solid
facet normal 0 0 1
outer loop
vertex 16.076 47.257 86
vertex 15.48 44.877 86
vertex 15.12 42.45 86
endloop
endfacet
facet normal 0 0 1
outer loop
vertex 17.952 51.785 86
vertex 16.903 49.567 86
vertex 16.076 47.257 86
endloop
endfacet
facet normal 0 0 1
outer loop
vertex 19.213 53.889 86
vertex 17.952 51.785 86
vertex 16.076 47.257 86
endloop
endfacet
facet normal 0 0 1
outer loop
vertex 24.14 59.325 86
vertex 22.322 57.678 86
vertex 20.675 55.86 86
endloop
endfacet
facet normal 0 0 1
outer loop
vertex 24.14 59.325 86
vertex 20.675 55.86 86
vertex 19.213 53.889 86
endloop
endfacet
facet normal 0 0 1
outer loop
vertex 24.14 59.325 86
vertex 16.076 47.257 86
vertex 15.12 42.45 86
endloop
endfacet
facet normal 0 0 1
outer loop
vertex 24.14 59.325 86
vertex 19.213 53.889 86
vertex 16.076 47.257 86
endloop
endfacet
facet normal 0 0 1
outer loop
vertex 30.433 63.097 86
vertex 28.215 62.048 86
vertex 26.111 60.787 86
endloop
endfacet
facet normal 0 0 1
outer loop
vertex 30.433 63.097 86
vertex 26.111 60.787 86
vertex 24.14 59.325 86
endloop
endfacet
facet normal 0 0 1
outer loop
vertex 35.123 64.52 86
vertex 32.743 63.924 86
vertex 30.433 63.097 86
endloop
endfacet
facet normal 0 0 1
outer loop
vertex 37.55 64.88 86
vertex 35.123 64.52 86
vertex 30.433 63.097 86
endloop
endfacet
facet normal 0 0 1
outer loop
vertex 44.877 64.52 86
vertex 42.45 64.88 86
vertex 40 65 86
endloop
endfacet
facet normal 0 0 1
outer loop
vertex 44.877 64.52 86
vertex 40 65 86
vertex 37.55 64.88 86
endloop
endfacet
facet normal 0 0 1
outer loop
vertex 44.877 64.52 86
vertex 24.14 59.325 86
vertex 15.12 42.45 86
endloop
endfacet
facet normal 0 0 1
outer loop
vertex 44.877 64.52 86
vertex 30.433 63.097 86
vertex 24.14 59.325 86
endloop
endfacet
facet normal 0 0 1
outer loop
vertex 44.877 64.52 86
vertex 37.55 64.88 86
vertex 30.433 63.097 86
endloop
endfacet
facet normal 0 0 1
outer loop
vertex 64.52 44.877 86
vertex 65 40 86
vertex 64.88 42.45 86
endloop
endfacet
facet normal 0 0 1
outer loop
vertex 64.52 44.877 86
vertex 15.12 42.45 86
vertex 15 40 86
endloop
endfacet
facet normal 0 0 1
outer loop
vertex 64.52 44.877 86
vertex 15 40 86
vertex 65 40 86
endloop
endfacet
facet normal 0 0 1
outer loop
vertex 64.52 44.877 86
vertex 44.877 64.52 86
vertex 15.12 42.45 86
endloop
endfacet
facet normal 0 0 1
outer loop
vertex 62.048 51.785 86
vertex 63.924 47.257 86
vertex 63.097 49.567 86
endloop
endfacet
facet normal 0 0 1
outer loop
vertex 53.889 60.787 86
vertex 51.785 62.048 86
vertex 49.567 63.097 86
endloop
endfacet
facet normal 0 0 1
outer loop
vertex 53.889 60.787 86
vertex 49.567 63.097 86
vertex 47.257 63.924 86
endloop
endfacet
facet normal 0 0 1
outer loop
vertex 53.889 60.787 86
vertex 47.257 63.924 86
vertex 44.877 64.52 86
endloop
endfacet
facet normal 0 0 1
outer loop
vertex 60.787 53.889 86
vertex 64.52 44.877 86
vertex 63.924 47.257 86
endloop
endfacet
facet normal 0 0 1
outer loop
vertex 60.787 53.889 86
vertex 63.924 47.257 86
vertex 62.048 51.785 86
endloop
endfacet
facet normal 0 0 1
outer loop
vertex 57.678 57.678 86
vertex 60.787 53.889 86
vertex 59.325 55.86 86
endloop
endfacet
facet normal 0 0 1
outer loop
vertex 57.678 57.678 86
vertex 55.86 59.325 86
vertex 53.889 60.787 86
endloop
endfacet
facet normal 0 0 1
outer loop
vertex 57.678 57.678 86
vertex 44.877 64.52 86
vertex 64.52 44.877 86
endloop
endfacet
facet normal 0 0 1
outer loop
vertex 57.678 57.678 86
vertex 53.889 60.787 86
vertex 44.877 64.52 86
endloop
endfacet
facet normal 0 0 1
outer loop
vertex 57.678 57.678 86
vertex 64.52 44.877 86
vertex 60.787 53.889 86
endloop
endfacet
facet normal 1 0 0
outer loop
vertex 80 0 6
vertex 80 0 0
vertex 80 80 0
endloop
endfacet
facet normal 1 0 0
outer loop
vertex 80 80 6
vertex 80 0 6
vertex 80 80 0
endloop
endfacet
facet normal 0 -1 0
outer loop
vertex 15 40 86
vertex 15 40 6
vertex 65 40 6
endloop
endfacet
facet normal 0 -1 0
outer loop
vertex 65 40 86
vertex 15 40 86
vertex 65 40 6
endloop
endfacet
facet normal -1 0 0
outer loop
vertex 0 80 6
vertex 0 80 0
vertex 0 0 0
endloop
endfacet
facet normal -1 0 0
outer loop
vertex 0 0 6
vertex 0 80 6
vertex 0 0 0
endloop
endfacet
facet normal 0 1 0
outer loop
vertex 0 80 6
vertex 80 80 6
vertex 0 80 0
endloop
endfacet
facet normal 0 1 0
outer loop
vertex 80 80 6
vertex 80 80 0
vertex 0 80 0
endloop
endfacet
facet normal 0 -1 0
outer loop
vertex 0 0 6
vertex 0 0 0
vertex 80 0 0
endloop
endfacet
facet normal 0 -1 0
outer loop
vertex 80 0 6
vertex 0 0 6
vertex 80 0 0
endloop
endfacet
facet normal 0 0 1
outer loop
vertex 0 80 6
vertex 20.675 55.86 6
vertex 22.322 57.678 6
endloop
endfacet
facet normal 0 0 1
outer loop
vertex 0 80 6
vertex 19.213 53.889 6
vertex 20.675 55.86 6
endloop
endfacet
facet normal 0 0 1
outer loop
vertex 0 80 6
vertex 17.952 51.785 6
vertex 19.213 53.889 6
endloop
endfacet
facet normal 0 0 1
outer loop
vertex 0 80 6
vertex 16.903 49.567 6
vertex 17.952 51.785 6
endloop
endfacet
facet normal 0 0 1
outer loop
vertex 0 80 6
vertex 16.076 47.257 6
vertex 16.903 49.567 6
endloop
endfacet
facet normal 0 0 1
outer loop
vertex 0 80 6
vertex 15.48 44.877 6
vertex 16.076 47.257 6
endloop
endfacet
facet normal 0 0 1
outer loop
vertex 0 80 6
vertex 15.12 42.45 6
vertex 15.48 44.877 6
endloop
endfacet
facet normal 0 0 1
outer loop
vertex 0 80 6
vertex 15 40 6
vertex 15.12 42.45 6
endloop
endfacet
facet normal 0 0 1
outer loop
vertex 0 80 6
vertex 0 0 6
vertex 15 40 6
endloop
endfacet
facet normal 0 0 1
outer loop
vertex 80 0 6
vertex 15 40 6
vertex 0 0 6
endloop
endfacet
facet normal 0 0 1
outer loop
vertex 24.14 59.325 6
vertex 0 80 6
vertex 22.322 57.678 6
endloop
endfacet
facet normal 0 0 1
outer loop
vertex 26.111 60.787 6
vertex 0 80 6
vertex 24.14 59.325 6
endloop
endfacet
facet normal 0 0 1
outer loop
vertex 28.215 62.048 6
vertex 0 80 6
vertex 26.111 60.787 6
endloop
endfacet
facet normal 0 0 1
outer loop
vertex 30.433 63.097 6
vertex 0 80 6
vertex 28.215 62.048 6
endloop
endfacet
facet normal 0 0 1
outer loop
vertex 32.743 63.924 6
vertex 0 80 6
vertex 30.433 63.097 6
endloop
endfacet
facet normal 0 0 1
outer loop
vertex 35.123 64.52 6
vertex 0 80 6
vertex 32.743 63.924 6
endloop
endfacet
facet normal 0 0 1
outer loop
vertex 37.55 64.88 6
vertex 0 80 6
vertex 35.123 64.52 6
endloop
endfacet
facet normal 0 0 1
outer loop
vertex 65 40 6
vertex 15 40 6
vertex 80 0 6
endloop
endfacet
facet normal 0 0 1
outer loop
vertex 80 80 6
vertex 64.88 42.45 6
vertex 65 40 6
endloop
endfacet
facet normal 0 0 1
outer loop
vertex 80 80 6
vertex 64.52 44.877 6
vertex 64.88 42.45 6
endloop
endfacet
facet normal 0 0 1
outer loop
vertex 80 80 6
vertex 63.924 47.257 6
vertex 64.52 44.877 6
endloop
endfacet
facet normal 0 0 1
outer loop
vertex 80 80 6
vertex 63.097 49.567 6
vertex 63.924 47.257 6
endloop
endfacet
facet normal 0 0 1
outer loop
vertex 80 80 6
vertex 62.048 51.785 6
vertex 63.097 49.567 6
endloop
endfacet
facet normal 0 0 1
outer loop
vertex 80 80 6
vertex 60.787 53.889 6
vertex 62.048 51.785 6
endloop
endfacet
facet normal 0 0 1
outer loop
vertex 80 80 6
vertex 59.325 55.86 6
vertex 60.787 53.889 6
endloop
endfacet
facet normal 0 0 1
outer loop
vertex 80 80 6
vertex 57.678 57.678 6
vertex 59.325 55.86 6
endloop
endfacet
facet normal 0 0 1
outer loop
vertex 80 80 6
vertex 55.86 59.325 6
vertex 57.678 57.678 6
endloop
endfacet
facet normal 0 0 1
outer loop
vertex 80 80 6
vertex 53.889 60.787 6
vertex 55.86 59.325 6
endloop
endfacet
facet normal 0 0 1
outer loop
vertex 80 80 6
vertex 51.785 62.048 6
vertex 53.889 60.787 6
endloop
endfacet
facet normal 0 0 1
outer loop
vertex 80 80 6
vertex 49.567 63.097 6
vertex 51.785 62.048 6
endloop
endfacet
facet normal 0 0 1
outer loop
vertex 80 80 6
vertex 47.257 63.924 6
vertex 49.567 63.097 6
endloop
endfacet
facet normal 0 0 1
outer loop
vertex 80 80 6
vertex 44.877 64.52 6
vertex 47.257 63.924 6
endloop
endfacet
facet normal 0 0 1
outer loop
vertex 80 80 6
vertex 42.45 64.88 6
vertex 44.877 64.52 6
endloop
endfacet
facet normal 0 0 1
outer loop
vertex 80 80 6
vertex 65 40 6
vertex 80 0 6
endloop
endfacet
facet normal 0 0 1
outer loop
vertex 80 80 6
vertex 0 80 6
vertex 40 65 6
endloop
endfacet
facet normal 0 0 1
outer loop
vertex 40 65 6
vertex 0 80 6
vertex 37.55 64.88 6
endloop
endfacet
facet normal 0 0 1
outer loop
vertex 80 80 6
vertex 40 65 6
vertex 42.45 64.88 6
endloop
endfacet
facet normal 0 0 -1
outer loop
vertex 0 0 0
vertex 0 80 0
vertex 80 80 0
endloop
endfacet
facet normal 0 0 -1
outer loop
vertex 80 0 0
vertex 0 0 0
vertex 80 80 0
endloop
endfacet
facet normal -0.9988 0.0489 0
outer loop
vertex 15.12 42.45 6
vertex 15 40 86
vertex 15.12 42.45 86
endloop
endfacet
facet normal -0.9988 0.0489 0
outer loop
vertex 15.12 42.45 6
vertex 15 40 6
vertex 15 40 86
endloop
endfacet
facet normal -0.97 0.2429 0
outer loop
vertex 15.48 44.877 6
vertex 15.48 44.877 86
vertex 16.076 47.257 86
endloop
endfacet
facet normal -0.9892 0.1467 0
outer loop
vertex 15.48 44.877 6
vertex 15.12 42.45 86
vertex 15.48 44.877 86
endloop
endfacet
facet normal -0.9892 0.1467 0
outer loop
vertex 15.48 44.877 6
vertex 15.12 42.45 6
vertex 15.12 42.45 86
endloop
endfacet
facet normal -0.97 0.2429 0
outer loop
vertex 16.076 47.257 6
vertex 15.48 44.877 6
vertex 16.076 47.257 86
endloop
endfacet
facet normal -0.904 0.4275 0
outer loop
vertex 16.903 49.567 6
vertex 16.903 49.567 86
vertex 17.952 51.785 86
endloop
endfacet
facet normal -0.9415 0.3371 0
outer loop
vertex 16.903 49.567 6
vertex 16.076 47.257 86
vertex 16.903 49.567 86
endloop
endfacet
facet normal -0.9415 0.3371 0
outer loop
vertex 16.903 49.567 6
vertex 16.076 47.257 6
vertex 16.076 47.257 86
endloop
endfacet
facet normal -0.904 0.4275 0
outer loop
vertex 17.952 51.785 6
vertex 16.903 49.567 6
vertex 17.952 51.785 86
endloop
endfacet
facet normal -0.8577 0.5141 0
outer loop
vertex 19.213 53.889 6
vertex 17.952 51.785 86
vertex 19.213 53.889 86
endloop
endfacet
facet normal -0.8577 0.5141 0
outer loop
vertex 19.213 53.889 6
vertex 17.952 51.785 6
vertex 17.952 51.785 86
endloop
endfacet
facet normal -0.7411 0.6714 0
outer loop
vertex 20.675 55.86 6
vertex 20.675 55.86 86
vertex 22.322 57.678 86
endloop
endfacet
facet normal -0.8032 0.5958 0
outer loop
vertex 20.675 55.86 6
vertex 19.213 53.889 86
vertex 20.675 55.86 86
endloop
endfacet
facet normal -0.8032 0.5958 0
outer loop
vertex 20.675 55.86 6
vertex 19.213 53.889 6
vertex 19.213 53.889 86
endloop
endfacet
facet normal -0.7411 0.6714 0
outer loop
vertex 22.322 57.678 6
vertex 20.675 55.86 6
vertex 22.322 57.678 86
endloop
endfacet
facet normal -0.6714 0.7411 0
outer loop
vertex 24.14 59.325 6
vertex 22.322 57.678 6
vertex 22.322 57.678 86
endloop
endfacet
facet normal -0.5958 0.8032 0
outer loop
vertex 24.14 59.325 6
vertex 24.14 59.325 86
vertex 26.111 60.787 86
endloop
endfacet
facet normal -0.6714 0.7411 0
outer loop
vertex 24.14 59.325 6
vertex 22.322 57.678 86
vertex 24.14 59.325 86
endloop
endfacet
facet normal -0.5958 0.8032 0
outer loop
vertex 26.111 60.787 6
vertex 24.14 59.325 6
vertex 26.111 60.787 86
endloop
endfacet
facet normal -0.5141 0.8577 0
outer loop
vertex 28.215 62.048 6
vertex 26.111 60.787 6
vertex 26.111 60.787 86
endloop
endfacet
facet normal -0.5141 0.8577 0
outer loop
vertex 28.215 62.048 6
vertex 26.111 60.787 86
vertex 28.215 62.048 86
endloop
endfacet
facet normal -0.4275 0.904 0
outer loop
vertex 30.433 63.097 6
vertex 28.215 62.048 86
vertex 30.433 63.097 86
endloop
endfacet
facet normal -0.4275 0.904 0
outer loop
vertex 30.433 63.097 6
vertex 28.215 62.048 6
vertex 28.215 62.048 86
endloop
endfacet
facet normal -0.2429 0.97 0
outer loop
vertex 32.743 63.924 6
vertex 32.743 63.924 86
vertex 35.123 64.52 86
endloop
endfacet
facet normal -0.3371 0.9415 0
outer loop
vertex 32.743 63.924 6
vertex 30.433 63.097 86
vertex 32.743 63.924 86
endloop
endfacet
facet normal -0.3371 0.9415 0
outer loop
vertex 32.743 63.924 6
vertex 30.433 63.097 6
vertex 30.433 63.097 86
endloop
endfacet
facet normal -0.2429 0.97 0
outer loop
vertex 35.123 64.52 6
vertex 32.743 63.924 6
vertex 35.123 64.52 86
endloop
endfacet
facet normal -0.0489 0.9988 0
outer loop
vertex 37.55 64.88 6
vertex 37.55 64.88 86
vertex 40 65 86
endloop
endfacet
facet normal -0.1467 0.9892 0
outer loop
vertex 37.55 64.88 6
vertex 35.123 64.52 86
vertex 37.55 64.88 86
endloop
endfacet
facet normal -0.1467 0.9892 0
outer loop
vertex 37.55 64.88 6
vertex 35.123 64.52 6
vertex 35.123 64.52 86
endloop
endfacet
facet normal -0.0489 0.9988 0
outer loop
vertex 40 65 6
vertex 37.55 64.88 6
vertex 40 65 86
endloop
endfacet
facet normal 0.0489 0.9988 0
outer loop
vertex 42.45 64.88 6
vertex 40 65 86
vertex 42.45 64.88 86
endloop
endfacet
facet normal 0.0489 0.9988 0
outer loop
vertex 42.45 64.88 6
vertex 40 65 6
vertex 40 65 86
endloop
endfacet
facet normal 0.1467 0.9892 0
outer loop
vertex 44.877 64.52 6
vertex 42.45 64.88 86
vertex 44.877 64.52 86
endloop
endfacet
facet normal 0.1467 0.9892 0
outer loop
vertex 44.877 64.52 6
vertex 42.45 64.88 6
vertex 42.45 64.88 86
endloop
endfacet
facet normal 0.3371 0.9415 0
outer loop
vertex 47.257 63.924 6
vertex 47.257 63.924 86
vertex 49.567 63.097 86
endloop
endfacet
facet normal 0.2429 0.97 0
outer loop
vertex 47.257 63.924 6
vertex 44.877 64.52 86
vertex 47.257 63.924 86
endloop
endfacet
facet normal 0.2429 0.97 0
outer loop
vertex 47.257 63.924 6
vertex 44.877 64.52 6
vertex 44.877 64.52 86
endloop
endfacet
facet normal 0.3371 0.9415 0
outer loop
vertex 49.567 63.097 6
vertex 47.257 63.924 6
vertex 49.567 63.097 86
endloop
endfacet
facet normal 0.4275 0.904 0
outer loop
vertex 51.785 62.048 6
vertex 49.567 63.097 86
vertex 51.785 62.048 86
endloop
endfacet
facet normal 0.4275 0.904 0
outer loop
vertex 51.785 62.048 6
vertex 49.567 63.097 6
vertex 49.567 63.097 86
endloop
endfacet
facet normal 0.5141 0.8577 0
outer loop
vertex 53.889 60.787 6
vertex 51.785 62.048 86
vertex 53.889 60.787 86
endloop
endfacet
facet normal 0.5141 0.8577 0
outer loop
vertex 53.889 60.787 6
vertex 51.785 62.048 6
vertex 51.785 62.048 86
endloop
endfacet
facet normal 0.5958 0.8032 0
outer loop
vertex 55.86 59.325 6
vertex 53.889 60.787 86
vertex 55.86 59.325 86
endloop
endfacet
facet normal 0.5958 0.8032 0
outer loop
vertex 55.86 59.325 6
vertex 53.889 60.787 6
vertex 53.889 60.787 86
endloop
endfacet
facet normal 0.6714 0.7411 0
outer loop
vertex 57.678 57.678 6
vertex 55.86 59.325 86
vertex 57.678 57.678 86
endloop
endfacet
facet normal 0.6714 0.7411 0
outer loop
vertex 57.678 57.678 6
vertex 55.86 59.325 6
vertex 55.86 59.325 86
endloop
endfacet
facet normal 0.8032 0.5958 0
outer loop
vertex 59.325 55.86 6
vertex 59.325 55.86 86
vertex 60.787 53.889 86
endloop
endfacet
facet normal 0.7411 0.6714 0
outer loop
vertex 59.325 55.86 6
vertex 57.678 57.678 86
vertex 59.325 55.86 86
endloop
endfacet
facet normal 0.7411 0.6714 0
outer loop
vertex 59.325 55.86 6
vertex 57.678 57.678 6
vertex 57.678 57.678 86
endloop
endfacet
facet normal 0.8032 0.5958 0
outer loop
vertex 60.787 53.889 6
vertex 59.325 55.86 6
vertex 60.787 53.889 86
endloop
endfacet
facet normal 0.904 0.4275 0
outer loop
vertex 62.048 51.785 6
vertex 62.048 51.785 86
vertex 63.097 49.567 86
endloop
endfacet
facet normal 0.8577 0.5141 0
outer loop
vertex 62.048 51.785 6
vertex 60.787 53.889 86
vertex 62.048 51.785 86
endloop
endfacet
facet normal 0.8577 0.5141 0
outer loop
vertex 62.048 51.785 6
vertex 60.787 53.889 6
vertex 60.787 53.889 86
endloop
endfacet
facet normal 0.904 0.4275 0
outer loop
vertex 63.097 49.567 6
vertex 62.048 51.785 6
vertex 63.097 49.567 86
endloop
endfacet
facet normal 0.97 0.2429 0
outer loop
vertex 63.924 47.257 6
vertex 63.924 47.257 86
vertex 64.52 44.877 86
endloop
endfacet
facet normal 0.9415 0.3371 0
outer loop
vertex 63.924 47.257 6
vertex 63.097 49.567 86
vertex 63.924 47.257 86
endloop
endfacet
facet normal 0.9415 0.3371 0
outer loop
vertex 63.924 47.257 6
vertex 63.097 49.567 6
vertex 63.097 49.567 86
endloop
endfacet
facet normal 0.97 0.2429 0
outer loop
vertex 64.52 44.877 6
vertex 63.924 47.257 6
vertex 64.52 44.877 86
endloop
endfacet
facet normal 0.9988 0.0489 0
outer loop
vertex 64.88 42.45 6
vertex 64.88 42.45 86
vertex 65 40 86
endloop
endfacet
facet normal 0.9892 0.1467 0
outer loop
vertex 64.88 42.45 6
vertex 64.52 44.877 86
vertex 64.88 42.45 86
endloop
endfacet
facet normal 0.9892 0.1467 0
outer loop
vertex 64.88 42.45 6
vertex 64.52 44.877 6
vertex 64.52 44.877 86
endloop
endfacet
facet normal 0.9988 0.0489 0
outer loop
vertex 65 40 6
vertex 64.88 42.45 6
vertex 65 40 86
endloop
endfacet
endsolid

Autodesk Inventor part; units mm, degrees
ref_plane "YZ Plane" through (0, 0, 0) normal (1, 0, 0) x (0, 1, 0)
ref_plane "XZ Plane" through (0, 0, 0) normal (0, 1, 0) x (-1, 0, 0)
ref_plane "XY Plane" through (0, 0, 0) normal (0, 0, 1) x (1, 0, 0)
sketch "Sketch1" plane through (0, 0, 0) normal (0, 0, 1) x (1, 0, 0)
  line L0 (0, 0) -> (80, 0)
  line L1 (80, 0) -> (80, 80)
  line L2 (80, 80) -> (0, 80)
  line L3 (0, 80) -> (0, 0)
  dimension "d0" = 80
  dimension "d1" = 80
extrude "Extrusion1" add sketch "Sketch1" along normal blind 6
sketch "Sketch2" plane through (0, 0, 6) normal (0, 0, 1) x (1, 0, 0)
  line L0 (80, 80) -> (0, 80) projected
  line L1 (0, 80) -> (0, 0) projected
  arc A0 (65, 40) -> (15, 40) centre (40, 40) ccw
  line L2 (15, 40) -> (65, 40)
  dimension "d4" = 50
  dimension "d5" = 40
  dimension "d6" = 40
extrude "Extrusion2" add sketch "Sketch2" along normal blind 80
properties part number "SpoolHolder"
